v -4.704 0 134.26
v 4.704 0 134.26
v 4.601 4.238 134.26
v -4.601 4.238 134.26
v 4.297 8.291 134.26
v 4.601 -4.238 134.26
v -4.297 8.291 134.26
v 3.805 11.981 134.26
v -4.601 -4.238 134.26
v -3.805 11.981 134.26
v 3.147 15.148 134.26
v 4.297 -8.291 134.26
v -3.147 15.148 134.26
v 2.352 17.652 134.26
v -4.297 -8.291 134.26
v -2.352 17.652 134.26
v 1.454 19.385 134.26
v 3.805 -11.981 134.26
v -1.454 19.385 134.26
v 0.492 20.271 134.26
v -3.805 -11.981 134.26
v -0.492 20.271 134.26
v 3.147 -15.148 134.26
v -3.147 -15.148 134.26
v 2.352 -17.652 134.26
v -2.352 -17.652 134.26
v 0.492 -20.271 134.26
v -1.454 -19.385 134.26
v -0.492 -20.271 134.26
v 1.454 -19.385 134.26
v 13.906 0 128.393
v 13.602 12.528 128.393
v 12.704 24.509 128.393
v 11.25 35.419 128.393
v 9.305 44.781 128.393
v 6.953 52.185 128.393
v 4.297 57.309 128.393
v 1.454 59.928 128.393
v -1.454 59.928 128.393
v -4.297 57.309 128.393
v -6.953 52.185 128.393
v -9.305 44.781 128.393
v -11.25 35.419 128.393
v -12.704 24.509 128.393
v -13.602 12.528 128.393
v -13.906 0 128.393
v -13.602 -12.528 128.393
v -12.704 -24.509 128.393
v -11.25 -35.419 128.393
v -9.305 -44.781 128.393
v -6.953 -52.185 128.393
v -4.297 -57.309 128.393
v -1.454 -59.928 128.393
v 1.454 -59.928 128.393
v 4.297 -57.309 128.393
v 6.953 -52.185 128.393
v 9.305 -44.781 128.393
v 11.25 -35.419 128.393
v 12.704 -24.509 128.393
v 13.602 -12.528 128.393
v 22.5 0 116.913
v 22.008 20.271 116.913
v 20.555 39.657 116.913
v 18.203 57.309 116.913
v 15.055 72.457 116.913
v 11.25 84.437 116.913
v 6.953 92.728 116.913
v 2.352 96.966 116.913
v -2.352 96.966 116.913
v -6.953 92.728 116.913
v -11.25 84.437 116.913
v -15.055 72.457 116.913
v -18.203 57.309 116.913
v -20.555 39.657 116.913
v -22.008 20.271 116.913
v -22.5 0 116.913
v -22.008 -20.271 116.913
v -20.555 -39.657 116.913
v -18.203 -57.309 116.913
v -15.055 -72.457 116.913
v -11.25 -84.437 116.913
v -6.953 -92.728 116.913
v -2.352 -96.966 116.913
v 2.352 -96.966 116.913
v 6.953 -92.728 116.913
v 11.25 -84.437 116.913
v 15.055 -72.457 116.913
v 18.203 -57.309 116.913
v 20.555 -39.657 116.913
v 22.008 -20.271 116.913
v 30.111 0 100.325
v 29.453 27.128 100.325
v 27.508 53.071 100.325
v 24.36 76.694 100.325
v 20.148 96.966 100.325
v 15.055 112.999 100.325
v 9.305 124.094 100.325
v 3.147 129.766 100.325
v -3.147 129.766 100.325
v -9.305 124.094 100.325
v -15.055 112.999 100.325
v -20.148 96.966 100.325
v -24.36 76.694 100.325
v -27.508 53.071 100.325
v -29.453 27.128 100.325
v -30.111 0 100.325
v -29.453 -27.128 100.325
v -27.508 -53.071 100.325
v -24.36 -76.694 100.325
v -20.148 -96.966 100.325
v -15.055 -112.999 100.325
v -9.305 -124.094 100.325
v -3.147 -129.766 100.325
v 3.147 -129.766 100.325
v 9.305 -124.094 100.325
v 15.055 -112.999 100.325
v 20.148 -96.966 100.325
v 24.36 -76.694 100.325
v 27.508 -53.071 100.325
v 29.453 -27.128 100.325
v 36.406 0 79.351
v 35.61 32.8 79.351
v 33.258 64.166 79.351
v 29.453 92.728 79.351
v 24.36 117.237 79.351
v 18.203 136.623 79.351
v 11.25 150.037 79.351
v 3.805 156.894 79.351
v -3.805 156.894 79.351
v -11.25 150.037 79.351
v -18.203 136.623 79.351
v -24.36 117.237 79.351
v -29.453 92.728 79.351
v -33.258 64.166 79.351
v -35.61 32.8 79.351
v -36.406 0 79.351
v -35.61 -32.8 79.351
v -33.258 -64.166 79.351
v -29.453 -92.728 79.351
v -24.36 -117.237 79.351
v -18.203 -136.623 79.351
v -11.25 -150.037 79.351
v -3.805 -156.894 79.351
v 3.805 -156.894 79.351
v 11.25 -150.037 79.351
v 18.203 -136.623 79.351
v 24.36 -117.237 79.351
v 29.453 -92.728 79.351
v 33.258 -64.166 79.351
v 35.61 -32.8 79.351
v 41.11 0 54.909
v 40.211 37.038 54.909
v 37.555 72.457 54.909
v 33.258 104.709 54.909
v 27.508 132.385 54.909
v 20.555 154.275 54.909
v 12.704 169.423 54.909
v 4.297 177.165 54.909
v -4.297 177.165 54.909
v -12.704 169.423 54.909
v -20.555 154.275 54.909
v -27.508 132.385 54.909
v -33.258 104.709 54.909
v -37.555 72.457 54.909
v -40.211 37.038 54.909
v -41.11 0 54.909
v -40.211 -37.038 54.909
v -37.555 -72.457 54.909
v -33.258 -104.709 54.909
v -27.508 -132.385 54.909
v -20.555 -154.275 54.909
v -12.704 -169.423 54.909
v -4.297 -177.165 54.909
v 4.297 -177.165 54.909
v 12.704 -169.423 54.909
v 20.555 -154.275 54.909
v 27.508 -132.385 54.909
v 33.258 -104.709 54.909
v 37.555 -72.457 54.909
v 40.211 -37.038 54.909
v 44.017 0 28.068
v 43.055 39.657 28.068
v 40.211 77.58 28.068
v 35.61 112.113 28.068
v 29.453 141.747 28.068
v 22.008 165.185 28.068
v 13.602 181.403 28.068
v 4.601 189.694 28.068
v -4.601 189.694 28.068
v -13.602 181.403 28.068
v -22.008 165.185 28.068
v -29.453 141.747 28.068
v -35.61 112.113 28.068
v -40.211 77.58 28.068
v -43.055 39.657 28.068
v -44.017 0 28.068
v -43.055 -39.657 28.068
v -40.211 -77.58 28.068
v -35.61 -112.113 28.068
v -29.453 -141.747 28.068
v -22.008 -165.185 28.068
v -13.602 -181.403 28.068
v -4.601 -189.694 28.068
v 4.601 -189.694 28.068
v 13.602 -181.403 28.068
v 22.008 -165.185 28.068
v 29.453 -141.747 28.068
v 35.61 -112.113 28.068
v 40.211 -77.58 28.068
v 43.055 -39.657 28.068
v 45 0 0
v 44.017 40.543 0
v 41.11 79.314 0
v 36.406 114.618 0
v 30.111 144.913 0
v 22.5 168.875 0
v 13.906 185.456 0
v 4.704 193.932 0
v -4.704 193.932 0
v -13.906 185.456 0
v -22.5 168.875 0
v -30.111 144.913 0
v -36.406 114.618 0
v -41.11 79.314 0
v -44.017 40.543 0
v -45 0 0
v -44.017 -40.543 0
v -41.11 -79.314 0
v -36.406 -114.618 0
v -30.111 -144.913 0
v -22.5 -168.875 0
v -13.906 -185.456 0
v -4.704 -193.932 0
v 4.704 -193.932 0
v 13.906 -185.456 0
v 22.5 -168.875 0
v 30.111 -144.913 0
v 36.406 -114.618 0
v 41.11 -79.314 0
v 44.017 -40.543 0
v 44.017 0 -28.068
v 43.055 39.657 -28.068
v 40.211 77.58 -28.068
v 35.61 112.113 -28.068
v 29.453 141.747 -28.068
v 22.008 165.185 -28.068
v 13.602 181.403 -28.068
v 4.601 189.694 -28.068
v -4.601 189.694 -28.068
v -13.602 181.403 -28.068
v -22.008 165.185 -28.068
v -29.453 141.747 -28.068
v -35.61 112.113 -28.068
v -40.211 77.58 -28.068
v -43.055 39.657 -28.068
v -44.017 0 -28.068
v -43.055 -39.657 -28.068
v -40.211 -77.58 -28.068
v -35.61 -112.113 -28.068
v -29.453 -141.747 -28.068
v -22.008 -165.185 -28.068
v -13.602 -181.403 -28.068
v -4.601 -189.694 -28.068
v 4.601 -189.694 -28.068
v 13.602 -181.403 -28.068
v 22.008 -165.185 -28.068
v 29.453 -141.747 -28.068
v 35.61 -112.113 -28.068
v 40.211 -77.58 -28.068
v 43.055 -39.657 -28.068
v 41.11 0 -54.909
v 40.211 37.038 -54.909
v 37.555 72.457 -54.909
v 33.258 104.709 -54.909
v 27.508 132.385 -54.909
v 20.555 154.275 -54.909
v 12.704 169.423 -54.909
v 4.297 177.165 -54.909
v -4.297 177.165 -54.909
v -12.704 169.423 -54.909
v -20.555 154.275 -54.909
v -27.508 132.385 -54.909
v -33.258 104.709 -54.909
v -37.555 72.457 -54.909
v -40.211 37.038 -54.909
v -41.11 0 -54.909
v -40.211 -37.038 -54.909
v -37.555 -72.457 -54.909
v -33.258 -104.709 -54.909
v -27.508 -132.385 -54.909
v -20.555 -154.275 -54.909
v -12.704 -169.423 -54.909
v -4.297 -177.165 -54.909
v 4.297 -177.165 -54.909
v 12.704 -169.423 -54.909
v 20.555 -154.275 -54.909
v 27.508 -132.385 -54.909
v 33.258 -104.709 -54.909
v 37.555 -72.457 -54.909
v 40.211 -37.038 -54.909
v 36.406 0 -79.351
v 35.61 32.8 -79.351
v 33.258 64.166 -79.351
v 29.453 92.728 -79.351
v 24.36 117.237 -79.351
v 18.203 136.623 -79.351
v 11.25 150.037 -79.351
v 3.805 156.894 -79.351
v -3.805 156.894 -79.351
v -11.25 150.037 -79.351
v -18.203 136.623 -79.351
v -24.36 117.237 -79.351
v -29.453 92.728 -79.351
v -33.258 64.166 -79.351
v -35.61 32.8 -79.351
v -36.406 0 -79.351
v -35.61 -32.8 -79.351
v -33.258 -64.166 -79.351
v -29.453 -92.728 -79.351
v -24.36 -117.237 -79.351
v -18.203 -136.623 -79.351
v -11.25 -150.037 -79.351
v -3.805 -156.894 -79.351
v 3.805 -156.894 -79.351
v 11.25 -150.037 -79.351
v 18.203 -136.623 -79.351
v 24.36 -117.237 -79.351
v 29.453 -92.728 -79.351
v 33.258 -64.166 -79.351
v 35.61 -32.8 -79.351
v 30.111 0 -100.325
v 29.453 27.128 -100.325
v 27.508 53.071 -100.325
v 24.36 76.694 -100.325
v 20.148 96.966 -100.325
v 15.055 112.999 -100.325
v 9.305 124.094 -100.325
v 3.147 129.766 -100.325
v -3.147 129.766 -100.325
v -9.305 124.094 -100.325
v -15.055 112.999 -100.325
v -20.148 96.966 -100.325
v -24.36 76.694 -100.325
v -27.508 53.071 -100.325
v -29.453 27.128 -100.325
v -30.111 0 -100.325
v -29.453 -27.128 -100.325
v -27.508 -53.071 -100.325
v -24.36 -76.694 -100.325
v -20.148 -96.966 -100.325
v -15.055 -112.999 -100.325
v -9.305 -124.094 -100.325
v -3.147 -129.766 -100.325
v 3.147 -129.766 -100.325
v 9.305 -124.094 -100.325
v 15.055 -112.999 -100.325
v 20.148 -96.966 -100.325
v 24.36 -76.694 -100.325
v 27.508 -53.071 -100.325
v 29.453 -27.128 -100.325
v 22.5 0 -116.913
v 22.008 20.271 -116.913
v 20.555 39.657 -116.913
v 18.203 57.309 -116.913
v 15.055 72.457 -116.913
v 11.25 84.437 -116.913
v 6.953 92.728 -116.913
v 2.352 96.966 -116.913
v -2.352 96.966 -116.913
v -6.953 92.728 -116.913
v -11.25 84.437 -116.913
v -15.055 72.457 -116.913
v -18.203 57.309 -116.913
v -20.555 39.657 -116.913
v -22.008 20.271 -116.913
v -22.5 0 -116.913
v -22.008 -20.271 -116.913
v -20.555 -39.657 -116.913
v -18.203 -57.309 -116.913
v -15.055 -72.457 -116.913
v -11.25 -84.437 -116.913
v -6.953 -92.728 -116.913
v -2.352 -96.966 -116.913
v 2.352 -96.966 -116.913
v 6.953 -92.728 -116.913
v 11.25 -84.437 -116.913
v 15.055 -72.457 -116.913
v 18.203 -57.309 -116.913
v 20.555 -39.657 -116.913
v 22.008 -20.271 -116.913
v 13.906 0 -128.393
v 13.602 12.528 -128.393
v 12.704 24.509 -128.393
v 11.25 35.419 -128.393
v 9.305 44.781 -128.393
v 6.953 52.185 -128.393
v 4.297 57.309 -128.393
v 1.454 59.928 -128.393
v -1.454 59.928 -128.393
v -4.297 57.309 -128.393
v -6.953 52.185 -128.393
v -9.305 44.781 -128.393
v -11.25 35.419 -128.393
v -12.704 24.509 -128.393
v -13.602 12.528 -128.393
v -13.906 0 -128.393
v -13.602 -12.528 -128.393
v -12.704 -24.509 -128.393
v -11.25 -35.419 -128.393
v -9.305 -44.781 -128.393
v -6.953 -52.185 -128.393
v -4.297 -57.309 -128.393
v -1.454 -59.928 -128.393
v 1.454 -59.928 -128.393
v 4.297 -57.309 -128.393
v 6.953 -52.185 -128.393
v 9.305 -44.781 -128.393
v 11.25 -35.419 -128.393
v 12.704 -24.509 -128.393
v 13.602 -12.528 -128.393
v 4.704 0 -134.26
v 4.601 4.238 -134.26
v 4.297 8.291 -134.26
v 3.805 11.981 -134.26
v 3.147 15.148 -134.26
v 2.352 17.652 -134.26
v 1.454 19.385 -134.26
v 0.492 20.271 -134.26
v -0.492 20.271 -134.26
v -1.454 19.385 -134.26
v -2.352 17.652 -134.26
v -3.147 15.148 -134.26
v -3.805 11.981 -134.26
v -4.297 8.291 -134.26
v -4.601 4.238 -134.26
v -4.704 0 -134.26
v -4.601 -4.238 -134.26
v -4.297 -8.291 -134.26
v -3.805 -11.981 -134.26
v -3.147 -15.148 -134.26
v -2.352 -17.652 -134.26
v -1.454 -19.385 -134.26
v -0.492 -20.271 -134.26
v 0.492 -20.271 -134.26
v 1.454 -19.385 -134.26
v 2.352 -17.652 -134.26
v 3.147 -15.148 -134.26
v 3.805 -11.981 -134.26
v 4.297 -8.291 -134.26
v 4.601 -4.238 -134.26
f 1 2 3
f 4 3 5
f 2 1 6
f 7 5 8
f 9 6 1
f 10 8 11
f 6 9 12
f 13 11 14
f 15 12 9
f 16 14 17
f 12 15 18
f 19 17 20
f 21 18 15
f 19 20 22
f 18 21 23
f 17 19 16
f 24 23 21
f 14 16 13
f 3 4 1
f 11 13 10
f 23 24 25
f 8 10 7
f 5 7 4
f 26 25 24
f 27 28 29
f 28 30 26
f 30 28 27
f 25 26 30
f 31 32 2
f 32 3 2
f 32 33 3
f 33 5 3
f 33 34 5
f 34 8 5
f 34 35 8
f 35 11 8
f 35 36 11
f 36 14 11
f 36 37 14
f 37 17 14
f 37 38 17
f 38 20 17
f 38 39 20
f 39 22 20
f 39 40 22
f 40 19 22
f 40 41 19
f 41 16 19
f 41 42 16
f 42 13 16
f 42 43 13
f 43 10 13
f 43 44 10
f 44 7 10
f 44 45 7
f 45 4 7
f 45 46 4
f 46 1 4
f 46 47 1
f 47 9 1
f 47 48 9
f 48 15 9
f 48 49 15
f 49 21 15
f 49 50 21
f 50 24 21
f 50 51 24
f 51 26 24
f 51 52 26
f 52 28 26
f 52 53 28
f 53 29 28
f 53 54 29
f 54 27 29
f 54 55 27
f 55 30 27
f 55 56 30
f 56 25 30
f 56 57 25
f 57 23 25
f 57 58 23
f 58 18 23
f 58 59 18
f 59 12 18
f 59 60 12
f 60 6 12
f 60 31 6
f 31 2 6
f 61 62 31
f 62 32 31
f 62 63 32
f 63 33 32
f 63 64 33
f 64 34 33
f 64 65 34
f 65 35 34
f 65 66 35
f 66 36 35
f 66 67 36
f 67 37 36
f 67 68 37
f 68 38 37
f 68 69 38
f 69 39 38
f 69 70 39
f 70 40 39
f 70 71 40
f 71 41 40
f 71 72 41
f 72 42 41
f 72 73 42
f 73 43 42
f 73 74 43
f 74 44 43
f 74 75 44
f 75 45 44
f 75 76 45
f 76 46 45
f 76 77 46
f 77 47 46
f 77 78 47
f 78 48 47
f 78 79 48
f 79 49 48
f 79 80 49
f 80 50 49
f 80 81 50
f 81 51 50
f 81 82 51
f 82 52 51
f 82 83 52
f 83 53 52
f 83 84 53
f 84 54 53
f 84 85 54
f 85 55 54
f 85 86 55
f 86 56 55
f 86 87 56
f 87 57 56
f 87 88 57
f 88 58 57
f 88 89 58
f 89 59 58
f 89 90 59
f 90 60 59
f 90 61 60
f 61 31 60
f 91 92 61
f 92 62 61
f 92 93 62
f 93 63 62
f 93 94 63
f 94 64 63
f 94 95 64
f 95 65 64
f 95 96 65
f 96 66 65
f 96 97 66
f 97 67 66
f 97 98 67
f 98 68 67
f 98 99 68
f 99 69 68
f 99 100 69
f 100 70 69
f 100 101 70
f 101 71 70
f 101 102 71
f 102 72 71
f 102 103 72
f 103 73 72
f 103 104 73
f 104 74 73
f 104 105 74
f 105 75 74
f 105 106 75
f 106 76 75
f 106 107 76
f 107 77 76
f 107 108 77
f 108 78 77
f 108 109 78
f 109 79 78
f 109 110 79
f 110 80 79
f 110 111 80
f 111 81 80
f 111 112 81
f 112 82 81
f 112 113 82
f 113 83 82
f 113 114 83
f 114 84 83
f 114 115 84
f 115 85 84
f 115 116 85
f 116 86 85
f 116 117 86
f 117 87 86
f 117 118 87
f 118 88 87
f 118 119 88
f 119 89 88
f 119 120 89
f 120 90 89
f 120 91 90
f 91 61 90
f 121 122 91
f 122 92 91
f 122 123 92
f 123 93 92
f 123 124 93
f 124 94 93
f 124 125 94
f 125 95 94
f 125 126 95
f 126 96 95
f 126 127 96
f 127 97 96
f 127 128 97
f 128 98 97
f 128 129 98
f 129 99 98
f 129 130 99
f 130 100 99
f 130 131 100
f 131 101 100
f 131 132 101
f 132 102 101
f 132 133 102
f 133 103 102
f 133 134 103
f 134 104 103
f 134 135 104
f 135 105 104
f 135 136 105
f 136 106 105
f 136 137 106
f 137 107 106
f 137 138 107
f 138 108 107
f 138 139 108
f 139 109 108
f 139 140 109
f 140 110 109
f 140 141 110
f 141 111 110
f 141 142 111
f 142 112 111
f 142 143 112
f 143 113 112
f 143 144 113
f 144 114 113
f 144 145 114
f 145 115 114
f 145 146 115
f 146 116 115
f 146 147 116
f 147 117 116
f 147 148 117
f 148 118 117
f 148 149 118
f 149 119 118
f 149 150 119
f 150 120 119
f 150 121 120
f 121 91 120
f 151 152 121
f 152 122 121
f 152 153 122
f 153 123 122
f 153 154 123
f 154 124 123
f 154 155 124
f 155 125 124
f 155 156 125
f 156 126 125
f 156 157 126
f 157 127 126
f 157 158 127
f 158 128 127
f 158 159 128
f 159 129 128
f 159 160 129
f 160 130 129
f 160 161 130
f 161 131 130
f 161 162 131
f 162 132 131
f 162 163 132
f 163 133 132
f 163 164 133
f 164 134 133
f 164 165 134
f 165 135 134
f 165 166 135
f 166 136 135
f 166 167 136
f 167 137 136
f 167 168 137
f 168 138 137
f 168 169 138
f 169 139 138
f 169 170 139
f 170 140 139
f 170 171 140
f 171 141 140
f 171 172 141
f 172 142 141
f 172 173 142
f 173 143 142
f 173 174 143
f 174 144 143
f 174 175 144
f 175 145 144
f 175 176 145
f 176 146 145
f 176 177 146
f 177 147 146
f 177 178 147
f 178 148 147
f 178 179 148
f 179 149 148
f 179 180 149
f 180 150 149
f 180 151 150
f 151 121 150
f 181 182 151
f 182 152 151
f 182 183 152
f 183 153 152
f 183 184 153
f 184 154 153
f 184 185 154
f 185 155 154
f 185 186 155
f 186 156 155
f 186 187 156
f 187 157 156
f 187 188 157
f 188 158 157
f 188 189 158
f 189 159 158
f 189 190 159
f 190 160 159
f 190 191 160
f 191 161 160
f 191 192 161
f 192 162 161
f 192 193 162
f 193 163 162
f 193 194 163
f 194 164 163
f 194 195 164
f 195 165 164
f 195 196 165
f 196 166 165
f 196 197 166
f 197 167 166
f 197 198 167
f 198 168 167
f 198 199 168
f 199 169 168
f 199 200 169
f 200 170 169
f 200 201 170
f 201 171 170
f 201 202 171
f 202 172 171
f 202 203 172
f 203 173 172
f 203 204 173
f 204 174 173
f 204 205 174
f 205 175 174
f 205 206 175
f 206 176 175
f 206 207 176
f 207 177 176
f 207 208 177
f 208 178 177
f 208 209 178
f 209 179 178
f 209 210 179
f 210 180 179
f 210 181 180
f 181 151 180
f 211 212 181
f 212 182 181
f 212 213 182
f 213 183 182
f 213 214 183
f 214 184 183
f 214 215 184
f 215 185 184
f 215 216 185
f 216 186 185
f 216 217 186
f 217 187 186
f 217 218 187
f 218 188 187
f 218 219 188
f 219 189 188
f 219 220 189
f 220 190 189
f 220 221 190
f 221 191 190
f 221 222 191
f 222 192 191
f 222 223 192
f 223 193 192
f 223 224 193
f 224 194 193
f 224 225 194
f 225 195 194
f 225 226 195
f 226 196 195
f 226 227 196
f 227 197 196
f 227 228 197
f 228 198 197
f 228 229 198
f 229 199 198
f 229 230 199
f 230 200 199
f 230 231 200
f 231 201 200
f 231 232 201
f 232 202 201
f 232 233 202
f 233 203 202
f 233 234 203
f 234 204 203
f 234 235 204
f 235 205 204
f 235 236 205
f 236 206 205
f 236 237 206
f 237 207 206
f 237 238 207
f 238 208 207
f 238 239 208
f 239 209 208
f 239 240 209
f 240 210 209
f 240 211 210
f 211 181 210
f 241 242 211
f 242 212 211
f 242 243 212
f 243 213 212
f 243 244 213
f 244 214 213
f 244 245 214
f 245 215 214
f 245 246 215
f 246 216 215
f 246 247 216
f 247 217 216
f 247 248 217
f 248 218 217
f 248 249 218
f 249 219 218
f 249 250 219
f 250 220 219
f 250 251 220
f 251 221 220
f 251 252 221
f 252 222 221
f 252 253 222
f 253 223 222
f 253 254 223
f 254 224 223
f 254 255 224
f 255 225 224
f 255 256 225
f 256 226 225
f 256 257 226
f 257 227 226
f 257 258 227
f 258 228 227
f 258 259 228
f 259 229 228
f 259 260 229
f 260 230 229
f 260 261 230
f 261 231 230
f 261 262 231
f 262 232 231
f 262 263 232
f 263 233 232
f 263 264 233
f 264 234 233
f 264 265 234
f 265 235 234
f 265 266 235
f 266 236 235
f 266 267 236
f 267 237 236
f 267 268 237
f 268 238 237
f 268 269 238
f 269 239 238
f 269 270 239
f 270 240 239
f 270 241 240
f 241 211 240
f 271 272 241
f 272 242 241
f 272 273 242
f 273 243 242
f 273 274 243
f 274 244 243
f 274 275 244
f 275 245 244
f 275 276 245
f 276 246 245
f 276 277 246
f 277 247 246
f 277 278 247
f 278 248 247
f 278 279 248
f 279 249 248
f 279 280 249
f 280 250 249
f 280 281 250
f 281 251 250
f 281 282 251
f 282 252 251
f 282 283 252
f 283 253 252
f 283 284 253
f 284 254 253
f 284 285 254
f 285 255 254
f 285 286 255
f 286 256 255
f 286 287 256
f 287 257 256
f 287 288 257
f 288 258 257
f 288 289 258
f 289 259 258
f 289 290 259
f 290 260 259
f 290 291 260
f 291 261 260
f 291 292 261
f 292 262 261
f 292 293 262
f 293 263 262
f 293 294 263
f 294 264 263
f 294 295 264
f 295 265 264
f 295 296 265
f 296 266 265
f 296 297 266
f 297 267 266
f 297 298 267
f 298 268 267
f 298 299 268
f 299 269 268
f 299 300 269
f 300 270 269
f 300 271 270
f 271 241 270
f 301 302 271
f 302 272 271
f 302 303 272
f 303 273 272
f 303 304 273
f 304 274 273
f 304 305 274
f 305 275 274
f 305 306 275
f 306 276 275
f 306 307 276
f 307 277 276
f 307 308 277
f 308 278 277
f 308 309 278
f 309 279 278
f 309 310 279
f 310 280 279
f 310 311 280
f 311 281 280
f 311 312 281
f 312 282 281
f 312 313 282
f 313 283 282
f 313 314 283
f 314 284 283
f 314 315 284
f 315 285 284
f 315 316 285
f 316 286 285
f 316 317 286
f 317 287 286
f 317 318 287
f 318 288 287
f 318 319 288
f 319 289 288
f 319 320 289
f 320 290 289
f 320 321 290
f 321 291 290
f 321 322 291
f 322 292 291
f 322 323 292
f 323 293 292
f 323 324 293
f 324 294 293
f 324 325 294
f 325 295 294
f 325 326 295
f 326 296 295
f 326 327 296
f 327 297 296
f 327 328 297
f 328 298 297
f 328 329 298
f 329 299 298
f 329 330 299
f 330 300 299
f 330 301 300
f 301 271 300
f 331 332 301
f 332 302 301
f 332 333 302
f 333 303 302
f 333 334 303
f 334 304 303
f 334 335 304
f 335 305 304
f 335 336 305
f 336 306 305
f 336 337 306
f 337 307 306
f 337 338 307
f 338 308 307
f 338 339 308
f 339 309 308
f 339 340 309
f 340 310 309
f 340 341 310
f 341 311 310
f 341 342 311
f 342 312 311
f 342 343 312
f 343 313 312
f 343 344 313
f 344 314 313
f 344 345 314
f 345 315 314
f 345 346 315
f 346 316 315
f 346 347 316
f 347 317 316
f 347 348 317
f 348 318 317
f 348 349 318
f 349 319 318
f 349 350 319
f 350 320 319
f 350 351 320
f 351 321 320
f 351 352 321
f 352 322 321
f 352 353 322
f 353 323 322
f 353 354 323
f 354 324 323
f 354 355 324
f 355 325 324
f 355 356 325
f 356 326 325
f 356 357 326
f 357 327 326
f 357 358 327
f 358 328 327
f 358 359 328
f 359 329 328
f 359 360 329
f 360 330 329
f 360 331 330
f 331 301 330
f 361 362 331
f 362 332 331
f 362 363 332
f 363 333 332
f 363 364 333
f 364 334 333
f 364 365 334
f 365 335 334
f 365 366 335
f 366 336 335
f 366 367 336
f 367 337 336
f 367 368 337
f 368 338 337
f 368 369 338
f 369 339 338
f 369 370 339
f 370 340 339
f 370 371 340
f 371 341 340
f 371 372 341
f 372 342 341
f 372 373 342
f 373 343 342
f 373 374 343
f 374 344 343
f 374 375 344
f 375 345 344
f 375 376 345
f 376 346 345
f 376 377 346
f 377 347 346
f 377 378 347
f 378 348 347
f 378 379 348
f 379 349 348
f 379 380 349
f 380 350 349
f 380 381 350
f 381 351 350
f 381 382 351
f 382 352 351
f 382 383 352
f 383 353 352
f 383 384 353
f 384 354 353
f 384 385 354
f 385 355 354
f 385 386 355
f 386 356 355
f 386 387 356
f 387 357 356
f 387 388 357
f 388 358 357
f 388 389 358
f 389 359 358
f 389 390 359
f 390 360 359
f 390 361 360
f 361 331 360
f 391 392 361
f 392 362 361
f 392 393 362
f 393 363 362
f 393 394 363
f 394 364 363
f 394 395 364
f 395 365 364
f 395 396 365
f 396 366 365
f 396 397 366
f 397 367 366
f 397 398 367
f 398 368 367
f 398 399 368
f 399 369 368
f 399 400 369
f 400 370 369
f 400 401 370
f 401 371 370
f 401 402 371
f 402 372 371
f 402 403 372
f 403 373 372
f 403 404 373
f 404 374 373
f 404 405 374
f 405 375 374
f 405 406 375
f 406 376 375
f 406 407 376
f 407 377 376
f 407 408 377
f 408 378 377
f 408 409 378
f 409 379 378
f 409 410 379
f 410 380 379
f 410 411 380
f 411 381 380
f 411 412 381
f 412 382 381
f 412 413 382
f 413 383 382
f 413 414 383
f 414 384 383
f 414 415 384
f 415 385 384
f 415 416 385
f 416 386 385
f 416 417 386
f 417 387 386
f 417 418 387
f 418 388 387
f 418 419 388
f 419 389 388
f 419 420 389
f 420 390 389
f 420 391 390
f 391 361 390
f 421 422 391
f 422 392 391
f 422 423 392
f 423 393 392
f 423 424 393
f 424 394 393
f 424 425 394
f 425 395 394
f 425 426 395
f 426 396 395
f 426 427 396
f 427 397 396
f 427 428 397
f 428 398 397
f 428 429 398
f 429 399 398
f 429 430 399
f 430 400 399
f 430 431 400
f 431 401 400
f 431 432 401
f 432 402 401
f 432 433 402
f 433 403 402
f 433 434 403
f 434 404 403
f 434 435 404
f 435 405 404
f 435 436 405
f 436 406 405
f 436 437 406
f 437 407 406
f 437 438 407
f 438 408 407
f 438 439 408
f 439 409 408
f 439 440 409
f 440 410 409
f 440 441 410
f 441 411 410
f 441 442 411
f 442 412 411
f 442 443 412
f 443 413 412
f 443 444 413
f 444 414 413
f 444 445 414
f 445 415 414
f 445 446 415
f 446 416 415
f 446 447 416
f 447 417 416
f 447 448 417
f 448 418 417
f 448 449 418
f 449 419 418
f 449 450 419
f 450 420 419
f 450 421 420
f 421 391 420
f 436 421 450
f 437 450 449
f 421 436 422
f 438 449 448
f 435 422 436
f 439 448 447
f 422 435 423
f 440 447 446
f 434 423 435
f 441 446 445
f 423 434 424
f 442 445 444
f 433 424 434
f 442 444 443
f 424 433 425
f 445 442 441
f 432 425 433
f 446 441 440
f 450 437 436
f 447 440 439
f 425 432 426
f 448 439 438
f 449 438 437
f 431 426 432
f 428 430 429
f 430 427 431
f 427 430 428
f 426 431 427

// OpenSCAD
// Generated by SolidPython 1.0.1 on 2020-07-29 00:46:45


scale(v = [3, 13, 9]) {
	sphere(r = 15);
}
/***********************************************
*********      SolidPython code:      **********
************************************************
 
# import packages: SolidPython
from solid import *
from solid.utils import *
from itertools import chain, combinations, permutations


class Resize:

    def __init__(self, scad_file):
        self.scad_file = scad_file
        #self.scad_file = import_scad(scad_file)
        # cone/cylinder param:
        self.r1 = 0
        self.r2 = 0
        self.h = 0
        # rectangular prism param:
        self.w = 0
        self.l = 0
        # ellipse param:
        self.r = 0

    # import OpenScad code (file name corresponds to shape)


    # classify shape + parameters
    def assign(self, param1, param2, param3):
        if self.scad_file == 'cone.scad':
            self.r1 = param1
            self.r2 = param2
            self.h = param3
        elif self.scad_file == 'cylinder.scad':
            self.r1 = param1
            self.r2 = param2
            self.h = param3
        elif self.scad_file == 'rectangularPrism.scad':
            self.h = param1
            self.l = param2
            self.w = param3
        else:
            self.r = param1
            self.h = param2

    # resize parameters
    def iterate(self):
        x = range(3, 20, 2)
        i = 1
        if self.scad_file == 'cone.scad':
            tempList = list(permutations(x, 2))
            for temp in tempList:
                param1 = temp[0]
                param2 = temp[1]
                filepath = 'produced_scad_files/' + 'cone' + str(param1) + '_' + str(param2) + '_' + '.scad'
                scad_render_to_file(cylinder(h=param1, r1=param2, r2=0), filepath)

        elif self.scad_file == 'cylinder.scad':
            tempList = list(permutations(x, 3))
            for temp in tempList:
                param1 = temp[0]
                param2 = temp[1]
                filepath = 'produced_scad_files/' + 'cylinder' + str(param1) + '_' + str(param2) + '_' + '.scad'
                scad_render_to_file(cylinder(h=param1, r1=param2, r2=param2), filepath)

        elif self.scad_file == 'rectangularPrism.scad':
            tempList = list(permutations(x, 3))
            for temp in tempList:
                param1 = temp[0]
                param2 = temp[1]
                param3 = temp[2]
                filepath = 'produced_scad_files/' + 'rectangularPrism' + str(param1) + '_' + str(param2) + '_' + str(
                    param3) + '.scad'
                scad_render_to_file(cube(size=(param1, param2, param3)), filepath)

        elif self.scad_file == 'ellipse.scad':
            tempList = list(permutations(x, 4))
            for temp in tempList:
                param1 = temp[0]
                param2 = temp[1]
                param3 = temp[2]
                param4 = temp[3]
                filepath = 'produced_scad_files/' + 'ellipse' + str(param1) + '_' + str(param2) + '_' + str(param3) + '_' + str(param4) + '.scad'
                scad_render_to_file(scale([param1, param2, param3])(sphere(r=param4)), filepath)

    def render_to_scadfile(self):
        scad_render_to_file(scad, 'example.scad') 
 
************************************************/
